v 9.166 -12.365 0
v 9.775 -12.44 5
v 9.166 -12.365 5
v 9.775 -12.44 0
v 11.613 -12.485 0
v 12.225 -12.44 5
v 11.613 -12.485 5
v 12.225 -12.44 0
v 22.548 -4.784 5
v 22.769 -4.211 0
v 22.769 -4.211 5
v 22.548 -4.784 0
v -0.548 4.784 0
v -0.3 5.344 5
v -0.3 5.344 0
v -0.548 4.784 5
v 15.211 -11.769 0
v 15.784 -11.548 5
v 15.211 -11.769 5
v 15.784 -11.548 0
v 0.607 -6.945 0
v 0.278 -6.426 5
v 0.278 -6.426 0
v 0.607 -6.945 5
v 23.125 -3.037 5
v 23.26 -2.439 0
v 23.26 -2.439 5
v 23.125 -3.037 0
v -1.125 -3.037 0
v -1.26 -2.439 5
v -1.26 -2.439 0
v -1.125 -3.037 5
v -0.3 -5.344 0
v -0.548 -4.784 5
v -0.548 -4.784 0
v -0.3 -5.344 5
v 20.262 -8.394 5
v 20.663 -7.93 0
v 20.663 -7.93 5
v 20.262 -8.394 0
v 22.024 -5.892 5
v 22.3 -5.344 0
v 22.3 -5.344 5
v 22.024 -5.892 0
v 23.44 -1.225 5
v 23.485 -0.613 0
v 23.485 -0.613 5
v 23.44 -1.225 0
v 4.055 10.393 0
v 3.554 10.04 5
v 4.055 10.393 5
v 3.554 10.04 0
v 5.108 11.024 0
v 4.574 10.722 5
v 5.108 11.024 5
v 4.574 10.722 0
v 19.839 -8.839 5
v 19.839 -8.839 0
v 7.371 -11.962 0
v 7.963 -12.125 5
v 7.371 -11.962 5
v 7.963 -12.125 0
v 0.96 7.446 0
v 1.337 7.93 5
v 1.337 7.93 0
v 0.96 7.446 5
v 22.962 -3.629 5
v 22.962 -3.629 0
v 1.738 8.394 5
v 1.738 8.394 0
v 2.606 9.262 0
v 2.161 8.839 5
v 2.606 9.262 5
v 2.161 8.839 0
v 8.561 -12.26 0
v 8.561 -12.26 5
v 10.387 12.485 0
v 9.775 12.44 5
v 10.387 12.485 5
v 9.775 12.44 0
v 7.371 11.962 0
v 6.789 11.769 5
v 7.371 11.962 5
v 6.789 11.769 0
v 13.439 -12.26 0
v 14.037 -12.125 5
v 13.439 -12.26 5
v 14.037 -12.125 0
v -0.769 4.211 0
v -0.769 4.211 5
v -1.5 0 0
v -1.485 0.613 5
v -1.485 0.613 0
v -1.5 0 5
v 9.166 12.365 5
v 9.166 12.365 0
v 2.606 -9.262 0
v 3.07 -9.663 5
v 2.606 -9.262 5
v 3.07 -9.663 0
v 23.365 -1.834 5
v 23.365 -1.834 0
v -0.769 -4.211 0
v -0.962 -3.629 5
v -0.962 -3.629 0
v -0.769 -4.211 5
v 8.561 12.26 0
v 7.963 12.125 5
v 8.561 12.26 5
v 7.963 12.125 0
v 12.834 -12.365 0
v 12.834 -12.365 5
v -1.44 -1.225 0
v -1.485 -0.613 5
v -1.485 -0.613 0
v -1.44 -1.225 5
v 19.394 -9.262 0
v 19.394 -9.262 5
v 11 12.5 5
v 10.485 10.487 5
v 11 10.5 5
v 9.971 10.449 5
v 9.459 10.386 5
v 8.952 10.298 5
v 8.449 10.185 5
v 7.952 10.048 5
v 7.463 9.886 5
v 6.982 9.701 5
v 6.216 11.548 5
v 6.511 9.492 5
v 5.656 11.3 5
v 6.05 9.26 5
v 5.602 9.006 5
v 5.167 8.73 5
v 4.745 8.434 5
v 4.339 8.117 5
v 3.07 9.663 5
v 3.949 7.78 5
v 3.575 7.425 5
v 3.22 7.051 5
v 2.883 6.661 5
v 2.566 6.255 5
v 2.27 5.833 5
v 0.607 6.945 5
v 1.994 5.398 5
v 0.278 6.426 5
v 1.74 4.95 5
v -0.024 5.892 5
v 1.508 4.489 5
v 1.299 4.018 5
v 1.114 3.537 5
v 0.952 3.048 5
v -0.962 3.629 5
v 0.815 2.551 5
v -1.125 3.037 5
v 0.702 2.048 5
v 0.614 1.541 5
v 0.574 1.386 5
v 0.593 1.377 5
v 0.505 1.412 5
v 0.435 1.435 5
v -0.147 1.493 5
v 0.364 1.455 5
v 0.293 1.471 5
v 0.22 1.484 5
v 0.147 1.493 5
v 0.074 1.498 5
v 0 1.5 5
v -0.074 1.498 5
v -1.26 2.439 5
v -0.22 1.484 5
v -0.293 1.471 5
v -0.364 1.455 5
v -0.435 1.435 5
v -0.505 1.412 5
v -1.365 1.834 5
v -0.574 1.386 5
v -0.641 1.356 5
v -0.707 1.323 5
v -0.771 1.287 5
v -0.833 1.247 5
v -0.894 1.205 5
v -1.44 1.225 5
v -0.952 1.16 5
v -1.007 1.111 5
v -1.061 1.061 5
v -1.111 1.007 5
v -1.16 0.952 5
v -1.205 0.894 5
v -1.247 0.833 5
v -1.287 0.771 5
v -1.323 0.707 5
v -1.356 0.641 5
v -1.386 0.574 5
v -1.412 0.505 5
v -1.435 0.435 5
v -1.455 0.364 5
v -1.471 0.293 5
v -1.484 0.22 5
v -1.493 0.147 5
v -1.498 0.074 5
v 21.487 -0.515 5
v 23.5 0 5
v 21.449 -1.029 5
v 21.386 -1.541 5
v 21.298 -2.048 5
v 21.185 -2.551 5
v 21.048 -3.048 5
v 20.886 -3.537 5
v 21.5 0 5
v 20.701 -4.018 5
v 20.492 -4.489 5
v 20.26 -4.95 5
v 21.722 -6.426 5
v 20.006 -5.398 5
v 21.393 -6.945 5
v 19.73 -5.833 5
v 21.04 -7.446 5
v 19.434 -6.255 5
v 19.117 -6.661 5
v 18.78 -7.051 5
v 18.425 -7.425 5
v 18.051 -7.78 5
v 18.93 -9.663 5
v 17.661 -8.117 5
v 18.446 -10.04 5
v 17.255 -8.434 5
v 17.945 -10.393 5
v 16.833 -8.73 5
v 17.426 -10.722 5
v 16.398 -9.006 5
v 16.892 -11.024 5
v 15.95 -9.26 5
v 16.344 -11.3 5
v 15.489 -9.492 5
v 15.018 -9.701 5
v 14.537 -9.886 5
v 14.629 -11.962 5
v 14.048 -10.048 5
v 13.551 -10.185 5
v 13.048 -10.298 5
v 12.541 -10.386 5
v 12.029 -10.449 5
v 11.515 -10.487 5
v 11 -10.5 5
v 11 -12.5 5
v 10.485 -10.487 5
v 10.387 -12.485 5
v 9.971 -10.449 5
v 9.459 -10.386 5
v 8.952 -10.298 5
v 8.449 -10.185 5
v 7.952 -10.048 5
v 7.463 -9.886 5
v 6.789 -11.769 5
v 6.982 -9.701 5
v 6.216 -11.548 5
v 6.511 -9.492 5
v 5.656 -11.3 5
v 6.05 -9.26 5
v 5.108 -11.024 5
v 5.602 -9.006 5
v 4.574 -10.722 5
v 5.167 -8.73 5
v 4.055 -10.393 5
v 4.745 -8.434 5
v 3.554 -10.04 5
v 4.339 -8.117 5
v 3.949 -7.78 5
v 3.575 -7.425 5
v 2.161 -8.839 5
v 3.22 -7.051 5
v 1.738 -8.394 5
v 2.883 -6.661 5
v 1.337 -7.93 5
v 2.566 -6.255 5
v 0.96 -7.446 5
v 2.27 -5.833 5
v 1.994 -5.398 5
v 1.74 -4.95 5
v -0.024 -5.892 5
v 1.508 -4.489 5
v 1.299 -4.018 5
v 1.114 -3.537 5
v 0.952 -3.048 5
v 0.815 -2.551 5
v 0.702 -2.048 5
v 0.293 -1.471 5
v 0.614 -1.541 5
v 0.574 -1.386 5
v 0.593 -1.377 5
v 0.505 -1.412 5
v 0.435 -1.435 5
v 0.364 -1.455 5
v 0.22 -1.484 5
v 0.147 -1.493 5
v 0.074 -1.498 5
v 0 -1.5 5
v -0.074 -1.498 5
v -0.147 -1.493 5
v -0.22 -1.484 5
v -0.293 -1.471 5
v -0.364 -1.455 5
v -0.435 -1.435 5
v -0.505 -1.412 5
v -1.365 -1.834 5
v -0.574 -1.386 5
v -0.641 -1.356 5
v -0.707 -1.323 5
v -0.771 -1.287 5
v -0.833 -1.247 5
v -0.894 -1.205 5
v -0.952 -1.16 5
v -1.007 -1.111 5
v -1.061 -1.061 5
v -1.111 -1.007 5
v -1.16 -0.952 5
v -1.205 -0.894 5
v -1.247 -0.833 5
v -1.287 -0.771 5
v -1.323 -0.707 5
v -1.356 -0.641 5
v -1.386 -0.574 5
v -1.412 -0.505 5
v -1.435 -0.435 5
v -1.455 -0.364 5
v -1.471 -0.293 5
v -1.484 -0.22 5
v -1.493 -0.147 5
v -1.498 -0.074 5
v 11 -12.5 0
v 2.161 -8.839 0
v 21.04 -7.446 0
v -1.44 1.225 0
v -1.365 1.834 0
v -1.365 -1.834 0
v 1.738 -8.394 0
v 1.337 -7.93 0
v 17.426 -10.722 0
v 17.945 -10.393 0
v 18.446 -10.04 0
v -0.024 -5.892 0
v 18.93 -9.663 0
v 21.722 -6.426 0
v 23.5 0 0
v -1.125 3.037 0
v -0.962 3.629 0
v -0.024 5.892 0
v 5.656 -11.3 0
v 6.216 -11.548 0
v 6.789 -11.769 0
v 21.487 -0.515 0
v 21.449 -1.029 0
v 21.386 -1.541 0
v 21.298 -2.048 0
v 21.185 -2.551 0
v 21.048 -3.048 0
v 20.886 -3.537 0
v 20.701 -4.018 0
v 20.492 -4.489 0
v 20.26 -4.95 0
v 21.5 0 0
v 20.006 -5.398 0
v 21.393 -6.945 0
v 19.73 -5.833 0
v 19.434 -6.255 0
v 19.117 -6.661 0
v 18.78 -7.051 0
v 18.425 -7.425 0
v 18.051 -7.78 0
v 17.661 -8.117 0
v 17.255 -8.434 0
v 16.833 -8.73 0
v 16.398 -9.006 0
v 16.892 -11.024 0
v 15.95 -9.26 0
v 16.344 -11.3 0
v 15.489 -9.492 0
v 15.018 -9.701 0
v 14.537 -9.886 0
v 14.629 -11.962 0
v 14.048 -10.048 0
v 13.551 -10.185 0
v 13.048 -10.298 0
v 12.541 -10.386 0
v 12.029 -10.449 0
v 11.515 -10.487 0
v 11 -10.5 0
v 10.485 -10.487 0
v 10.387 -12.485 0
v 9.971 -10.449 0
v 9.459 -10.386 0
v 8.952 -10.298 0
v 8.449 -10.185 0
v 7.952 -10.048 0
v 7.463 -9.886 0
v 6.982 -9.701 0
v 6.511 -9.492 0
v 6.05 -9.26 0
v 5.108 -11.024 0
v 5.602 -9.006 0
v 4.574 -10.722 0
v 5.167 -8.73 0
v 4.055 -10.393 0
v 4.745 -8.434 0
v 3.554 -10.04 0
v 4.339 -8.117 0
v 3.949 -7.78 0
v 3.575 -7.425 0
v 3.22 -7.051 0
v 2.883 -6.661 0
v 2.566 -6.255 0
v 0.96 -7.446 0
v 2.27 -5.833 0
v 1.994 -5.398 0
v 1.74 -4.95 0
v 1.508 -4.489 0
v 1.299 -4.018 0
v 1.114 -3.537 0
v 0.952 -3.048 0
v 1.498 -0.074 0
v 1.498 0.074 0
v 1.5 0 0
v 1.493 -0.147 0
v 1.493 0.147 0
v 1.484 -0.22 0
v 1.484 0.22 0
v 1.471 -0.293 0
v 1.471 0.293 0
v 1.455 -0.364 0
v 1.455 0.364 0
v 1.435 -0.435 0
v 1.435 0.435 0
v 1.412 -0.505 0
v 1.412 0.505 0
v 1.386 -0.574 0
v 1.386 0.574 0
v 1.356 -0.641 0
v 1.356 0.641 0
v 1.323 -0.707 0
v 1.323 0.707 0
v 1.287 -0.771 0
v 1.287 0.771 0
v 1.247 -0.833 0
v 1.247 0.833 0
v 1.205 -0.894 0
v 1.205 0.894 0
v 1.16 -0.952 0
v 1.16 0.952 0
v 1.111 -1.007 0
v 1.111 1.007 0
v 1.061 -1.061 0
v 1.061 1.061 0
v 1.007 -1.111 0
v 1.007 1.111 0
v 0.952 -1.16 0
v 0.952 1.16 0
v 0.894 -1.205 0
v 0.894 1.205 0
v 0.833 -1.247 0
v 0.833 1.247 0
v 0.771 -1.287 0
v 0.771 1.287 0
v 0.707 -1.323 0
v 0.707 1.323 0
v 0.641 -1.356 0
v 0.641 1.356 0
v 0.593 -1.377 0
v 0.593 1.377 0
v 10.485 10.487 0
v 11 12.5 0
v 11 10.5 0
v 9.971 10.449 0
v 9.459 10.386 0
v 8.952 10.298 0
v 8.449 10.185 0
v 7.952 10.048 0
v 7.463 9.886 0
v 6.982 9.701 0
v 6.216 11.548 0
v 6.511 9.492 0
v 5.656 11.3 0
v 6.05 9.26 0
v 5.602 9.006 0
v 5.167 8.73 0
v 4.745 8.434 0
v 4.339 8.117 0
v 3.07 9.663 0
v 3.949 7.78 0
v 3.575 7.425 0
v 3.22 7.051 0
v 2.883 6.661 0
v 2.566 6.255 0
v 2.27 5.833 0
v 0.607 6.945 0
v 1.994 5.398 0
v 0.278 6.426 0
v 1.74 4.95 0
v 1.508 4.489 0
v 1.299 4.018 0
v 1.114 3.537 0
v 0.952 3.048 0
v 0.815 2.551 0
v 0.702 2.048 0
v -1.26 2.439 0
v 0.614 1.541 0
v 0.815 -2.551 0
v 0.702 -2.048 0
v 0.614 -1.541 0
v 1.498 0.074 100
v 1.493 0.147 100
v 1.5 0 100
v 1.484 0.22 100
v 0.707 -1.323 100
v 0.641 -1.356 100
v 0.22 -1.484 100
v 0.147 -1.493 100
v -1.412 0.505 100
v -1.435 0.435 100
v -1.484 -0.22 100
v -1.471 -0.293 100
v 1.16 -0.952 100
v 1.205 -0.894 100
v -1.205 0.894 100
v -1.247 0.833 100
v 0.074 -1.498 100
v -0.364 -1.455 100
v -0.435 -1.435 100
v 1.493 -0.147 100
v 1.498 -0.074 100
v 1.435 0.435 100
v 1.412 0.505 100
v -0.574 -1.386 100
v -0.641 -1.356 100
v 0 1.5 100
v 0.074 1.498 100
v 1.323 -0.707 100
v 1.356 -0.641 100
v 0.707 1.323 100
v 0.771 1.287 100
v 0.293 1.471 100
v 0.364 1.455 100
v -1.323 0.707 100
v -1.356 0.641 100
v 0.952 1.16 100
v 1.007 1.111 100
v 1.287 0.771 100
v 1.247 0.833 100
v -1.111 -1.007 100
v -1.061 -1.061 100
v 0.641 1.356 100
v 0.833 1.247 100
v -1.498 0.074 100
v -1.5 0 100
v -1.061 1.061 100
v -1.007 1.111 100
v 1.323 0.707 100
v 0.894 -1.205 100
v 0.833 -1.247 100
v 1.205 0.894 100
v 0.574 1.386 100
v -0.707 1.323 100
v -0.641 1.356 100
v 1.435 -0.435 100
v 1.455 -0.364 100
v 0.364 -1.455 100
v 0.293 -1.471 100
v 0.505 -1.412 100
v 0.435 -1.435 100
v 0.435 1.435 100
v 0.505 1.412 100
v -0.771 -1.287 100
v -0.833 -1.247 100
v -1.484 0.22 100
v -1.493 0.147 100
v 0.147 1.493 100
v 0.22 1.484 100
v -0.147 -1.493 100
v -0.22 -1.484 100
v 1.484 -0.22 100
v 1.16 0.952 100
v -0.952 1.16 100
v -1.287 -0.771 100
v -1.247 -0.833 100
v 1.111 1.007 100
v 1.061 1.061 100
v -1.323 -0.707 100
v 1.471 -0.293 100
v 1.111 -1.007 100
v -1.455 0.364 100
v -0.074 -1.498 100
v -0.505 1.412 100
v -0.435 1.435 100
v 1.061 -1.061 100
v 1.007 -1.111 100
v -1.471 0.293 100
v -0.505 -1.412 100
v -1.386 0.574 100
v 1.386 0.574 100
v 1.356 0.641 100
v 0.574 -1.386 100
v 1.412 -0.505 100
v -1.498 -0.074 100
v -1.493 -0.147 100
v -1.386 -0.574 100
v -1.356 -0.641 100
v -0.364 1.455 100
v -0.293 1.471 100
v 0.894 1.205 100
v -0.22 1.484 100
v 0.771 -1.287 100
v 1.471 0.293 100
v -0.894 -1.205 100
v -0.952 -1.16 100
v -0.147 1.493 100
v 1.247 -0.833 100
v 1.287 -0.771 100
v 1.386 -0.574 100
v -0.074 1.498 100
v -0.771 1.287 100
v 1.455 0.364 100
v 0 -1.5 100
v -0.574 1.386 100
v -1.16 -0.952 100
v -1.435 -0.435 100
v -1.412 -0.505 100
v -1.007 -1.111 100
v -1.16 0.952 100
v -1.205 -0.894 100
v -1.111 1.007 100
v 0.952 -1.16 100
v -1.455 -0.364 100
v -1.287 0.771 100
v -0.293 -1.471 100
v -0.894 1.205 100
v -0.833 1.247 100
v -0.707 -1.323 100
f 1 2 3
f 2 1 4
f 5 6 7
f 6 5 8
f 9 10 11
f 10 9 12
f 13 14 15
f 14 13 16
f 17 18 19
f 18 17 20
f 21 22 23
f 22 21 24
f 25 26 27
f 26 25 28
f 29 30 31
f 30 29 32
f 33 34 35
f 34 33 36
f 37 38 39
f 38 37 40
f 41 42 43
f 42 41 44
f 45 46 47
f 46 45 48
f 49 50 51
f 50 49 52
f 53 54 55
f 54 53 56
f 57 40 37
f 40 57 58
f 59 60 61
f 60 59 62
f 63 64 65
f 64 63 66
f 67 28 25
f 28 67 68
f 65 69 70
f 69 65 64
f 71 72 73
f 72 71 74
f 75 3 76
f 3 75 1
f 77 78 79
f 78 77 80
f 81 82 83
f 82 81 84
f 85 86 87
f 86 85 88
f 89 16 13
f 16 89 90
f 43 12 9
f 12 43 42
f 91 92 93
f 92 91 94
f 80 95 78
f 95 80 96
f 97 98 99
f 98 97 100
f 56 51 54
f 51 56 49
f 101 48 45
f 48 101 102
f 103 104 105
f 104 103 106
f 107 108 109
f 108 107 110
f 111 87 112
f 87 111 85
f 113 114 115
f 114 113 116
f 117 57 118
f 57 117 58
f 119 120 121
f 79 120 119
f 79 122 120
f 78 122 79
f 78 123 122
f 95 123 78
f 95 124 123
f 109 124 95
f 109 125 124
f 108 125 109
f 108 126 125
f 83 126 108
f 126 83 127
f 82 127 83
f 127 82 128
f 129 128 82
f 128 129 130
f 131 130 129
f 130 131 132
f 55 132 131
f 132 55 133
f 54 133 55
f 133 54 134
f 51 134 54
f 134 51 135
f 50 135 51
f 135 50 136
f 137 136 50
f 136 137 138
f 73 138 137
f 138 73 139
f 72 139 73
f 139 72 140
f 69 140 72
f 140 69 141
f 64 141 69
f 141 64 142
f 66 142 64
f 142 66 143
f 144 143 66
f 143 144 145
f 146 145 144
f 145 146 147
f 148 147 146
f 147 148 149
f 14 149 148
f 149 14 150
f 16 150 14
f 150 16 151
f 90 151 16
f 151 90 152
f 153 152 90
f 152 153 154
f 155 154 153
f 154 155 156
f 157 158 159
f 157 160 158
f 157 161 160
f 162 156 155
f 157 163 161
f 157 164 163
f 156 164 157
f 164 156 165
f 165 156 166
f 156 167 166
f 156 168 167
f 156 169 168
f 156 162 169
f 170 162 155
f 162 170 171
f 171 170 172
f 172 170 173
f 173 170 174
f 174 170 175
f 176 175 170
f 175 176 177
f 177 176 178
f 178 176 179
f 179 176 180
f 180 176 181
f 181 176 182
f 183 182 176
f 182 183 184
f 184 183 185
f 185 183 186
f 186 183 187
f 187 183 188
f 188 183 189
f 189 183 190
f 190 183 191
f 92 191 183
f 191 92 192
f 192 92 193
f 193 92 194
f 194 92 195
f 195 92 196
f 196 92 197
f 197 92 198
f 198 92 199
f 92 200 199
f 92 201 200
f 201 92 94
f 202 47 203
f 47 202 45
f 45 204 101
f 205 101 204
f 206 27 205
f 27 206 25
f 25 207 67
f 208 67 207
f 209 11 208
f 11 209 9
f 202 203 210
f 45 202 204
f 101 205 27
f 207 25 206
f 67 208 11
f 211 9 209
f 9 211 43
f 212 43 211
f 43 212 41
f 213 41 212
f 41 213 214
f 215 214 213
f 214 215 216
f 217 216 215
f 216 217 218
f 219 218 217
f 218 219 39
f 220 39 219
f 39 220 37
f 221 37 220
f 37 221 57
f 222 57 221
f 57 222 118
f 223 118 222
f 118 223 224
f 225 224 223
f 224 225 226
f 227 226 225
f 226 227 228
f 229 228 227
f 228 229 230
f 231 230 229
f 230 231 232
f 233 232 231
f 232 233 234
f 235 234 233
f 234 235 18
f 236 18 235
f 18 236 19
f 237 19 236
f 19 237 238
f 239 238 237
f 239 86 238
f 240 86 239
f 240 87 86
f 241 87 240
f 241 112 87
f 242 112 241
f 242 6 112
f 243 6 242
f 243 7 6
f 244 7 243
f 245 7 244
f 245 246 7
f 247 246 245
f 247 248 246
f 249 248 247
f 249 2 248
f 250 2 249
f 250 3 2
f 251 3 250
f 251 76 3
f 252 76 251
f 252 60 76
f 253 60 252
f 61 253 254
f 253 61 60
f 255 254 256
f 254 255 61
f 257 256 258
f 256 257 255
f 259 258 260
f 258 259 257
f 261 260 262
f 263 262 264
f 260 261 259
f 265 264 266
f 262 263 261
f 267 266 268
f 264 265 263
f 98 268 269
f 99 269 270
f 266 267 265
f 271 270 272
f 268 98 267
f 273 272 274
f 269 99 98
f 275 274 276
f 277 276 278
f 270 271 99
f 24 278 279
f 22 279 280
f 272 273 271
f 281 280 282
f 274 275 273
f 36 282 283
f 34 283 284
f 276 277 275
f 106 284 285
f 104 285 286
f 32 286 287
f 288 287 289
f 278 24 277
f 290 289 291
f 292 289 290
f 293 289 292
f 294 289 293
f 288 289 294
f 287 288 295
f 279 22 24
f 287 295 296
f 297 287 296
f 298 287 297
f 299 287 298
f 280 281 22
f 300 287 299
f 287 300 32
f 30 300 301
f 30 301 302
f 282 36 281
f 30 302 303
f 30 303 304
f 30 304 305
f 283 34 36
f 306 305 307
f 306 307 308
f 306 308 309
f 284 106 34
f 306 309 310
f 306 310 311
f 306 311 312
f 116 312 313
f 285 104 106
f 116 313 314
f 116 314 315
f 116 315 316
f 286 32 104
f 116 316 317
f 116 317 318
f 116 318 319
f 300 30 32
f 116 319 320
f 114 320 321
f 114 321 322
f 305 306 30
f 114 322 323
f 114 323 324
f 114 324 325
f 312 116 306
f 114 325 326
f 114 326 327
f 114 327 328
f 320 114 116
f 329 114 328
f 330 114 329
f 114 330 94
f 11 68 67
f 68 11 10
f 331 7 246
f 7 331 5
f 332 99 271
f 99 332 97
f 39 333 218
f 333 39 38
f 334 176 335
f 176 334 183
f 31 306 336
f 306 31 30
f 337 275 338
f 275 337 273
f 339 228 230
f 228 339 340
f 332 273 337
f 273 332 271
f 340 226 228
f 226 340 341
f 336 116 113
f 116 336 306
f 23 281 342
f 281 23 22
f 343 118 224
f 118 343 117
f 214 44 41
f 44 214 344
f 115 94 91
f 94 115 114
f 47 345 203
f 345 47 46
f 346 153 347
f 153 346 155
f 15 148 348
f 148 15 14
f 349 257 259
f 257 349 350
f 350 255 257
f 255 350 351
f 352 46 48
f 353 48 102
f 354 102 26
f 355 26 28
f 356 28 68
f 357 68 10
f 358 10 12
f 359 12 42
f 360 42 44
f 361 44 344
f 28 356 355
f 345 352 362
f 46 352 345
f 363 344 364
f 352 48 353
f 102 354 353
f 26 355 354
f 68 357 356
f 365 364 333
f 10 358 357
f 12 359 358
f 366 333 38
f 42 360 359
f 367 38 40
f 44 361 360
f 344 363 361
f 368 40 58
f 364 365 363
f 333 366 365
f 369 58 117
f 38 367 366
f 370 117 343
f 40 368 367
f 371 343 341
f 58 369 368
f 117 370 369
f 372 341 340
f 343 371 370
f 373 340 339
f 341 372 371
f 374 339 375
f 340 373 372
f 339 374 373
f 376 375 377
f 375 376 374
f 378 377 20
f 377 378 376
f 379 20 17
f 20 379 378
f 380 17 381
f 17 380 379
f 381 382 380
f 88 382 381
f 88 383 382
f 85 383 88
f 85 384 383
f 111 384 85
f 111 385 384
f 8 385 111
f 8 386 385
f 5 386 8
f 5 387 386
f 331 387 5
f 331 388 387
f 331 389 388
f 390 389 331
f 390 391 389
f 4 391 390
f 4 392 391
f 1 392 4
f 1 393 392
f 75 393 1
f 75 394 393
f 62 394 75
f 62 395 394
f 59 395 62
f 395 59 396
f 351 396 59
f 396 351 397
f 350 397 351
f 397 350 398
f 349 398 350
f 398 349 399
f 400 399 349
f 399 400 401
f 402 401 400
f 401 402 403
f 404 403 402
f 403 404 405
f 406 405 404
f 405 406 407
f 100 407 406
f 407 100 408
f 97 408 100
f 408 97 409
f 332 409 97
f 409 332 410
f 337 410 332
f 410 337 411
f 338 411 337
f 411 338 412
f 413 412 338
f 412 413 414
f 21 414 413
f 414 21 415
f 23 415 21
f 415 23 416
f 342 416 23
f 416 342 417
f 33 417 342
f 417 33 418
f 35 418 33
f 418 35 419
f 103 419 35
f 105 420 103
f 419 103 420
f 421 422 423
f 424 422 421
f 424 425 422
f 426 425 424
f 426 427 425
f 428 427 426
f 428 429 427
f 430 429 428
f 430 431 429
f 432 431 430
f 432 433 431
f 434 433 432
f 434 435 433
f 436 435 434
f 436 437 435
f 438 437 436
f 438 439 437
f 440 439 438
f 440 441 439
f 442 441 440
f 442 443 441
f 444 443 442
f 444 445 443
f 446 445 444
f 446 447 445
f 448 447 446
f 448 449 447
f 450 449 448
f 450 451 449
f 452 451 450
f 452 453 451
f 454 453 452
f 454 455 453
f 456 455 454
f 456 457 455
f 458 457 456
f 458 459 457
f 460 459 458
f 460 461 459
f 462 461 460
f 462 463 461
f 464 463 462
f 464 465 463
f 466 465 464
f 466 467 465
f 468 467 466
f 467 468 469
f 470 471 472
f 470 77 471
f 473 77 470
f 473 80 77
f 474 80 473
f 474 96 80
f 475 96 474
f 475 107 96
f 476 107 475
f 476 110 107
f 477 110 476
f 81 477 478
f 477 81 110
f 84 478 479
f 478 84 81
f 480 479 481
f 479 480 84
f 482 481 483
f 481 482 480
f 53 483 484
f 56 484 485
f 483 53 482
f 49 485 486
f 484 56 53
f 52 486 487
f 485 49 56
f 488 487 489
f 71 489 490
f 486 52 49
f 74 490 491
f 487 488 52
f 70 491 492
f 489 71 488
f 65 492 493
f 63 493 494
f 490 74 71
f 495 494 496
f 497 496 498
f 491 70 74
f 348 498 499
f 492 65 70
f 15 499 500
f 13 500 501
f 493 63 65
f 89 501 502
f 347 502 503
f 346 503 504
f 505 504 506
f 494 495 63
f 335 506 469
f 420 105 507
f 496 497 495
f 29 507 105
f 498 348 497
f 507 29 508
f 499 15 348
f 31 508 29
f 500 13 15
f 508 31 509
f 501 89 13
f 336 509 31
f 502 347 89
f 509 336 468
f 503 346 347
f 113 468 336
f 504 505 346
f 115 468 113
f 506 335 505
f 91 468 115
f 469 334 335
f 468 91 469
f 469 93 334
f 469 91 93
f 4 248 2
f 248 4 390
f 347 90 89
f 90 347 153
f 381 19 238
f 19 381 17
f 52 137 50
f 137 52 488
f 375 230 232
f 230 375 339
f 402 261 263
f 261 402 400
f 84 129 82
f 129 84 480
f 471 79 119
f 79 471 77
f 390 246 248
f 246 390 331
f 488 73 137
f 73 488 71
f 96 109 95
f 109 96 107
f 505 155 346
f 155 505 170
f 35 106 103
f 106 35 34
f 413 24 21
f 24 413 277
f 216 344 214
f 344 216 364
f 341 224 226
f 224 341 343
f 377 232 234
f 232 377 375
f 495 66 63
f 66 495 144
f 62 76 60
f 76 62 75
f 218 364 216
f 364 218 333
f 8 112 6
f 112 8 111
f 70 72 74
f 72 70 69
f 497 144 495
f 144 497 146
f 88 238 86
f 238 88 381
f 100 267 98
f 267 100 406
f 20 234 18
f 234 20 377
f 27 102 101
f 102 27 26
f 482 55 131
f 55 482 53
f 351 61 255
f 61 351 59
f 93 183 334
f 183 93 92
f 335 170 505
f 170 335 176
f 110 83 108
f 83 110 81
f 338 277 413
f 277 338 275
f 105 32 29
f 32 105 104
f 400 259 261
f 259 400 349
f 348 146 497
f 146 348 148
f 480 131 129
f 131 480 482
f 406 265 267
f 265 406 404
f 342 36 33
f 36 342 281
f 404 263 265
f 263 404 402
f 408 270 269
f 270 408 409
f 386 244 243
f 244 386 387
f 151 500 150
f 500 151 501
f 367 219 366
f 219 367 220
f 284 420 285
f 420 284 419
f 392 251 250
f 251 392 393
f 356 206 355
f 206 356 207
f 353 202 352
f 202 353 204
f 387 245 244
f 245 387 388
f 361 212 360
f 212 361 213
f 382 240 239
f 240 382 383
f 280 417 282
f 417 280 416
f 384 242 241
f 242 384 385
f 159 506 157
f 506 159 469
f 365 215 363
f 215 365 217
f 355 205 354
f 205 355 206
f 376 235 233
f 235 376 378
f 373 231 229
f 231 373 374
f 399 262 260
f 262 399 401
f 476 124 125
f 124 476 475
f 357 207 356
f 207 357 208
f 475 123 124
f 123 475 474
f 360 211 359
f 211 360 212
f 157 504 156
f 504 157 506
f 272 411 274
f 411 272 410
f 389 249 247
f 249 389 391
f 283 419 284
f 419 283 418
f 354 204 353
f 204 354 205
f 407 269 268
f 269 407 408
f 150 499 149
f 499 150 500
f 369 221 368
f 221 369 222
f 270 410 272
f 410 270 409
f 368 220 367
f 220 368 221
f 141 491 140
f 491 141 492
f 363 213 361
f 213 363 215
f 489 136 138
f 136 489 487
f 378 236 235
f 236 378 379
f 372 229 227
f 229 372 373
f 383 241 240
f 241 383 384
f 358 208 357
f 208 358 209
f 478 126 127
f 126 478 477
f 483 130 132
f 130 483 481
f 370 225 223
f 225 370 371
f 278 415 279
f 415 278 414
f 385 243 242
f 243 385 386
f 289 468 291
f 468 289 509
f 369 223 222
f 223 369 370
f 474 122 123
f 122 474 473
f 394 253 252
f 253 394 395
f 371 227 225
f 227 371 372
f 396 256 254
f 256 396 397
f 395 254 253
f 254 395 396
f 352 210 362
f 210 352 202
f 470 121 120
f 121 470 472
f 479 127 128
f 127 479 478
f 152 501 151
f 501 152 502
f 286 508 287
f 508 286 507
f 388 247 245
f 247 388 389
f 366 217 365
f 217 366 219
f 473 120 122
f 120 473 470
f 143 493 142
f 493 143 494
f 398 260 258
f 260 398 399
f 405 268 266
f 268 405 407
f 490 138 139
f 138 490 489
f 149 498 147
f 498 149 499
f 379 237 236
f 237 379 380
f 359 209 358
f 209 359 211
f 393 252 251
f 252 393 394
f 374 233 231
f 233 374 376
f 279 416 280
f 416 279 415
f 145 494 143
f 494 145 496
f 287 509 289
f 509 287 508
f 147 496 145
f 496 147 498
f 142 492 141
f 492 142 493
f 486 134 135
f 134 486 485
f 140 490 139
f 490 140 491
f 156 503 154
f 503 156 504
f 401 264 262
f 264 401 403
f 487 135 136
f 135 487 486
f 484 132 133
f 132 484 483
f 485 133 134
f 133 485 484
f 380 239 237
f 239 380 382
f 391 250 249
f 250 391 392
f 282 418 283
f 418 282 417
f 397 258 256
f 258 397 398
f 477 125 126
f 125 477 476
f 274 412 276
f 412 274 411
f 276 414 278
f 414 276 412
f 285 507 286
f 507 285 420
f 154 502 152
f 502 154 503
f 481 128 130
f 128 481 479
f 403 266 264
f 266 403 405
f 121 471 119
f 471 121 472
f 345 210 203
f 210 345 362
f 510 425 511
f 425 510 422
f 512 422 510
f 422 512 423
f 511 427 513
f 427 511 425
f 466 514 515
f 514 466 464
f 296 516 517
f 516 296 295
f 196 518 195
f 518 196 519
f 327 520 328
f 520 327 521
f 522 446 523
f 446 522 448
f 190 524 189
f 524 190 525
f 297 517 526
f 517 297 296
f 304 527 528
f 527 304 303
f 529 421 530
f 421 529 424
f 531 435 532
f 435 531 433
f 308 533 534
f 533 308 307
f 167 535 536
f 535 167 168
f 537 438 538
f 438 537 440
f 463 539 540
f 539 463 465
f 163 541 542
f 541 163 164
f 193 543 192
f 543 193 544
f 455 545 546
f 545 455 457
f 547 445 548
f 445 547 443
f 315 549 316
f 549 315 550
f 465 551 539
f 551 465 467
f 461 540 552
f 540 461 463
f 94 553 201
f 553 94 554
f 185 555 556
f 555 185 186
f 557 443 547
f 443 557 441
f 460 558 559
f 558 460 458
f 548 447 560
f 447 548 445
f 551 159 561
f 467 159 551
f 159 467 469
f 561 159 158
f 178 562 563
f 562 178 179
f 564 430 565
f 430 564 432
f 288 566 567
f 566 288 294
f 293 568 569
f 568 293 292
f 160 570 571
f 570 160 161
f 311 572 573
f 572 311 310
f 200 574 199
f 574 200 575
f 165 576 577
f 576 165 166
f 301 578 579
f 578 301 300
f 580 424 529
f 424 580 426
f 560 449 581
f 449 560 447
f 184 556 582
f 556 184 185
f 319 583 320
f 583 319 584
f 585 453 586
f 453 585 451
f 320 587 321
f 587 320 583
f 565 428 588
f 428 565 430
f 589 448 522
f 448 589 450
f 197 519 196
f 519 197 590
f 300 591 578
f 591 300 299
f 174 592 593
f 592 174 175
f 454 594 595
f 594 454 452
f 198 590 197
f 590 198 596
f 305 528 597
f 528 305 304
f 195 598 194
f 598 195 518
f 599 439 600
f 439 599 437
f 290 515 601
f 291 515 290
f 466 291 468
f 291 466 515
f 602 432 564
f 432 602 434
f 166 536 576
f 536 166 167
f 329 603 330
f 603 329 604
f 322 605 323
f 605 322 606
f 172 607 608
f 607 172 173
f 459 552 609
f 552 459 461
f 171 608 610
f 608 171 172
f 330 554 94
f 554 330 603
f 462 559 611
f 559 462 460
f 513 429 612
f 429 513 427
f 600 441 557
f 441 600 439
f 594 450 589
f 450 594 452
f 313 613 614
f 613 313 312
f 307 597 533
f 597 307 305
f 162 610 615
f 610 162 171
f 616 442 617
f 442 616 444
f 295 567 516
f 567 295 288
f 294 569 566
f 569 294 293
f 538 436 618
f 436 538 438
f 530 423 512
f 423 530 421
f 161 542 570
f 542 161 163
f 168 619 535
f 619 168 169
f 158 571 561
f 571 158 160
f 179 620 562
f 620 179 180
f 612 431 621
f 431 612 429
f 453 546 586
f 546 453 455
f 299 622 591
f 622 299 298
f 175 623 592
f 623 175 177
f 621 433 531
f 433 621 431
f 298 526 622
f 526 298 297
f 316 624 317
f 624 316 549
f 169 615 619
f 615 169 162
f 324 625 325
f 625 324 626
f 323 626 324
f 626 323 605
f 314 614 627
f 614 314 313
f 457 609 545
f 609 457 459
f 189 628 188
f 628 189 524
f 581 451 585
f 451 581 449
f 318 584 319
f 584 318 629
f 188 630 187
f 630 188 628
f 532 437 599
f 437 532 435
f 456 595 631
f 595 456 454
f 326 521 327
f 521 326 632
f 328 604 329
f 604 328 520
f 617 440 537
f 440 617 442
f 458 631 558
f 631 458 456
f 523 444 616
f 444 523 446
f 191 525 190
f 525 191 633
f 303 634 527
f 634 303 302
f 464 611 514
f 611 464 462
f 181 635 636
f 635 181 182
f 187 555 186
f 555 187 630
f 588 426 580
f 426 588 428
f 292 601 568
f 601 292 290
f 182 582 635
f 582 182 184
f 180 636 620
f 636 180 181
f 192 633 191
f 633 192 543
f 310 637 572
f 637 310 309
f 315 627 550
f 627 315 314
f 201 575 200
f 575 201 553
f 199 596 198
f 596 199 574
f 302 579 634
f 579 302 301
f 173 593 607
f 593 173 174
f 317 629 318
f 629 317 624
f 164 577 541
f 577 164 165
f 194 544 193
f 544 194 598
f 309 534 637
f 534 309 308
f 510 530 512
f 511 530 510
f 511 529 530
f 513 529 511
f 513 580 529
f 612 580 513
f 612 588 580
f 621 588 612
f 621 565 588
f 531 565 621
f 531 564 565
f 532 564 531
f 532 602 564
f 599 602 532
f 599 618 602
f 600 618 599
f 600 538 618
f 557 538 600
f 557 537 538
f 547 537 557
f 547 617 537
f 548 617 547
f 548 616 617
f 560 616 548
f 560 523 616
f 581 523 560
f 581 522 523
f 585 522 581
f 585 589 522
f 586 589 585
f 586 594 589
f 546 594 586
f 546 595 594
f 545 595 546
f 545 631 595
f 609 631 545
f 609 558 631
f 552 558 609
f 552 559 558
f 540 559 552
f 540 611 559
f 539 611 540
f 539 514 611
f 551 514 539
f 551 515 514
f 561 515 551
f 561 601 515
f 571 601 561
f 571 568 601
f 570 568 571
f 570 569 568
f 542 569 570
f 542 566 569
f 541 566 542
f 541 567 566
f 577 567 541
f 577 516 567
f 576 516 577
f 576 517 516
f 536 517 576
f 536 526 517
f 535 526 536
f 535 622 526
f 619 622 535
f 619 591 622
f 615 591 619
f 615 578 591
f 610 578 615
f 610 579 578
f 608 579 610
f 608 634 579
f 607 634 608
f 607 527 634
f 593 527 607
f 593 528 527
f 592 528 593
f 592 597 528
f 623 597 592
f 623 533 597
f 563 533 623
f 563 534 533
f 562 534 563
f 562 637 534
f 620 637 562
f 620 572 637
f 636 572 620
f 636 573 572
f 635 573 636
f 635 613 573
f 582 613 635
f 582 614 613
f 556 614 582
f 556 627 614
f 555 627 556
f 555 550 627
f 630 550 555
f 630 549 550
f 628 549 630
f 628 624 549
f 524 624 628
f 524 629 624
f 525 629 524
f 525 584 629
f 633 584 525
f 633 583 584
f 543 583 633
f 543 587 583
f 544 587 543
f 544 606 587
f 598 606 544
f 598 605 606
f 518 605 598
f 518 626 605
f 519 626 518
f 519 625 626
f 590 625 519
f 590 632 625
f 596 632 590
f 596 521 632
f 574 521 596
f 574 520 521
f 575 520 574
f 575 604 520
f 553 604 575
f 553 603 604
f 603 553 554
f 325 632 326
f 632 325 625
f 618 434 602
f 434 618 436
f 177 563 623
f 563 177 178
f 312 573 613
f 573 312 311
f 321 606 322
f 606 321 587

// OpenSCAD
$fn=128;
cylinder(h=100,d=3);
translate([11,0,0]) difference()
{
    cylinder(h=5,d=25);
    translate([0,0,-1]) cylinder(h=7,d=21);
    translate([0,0,-1]) cube(20);
}
